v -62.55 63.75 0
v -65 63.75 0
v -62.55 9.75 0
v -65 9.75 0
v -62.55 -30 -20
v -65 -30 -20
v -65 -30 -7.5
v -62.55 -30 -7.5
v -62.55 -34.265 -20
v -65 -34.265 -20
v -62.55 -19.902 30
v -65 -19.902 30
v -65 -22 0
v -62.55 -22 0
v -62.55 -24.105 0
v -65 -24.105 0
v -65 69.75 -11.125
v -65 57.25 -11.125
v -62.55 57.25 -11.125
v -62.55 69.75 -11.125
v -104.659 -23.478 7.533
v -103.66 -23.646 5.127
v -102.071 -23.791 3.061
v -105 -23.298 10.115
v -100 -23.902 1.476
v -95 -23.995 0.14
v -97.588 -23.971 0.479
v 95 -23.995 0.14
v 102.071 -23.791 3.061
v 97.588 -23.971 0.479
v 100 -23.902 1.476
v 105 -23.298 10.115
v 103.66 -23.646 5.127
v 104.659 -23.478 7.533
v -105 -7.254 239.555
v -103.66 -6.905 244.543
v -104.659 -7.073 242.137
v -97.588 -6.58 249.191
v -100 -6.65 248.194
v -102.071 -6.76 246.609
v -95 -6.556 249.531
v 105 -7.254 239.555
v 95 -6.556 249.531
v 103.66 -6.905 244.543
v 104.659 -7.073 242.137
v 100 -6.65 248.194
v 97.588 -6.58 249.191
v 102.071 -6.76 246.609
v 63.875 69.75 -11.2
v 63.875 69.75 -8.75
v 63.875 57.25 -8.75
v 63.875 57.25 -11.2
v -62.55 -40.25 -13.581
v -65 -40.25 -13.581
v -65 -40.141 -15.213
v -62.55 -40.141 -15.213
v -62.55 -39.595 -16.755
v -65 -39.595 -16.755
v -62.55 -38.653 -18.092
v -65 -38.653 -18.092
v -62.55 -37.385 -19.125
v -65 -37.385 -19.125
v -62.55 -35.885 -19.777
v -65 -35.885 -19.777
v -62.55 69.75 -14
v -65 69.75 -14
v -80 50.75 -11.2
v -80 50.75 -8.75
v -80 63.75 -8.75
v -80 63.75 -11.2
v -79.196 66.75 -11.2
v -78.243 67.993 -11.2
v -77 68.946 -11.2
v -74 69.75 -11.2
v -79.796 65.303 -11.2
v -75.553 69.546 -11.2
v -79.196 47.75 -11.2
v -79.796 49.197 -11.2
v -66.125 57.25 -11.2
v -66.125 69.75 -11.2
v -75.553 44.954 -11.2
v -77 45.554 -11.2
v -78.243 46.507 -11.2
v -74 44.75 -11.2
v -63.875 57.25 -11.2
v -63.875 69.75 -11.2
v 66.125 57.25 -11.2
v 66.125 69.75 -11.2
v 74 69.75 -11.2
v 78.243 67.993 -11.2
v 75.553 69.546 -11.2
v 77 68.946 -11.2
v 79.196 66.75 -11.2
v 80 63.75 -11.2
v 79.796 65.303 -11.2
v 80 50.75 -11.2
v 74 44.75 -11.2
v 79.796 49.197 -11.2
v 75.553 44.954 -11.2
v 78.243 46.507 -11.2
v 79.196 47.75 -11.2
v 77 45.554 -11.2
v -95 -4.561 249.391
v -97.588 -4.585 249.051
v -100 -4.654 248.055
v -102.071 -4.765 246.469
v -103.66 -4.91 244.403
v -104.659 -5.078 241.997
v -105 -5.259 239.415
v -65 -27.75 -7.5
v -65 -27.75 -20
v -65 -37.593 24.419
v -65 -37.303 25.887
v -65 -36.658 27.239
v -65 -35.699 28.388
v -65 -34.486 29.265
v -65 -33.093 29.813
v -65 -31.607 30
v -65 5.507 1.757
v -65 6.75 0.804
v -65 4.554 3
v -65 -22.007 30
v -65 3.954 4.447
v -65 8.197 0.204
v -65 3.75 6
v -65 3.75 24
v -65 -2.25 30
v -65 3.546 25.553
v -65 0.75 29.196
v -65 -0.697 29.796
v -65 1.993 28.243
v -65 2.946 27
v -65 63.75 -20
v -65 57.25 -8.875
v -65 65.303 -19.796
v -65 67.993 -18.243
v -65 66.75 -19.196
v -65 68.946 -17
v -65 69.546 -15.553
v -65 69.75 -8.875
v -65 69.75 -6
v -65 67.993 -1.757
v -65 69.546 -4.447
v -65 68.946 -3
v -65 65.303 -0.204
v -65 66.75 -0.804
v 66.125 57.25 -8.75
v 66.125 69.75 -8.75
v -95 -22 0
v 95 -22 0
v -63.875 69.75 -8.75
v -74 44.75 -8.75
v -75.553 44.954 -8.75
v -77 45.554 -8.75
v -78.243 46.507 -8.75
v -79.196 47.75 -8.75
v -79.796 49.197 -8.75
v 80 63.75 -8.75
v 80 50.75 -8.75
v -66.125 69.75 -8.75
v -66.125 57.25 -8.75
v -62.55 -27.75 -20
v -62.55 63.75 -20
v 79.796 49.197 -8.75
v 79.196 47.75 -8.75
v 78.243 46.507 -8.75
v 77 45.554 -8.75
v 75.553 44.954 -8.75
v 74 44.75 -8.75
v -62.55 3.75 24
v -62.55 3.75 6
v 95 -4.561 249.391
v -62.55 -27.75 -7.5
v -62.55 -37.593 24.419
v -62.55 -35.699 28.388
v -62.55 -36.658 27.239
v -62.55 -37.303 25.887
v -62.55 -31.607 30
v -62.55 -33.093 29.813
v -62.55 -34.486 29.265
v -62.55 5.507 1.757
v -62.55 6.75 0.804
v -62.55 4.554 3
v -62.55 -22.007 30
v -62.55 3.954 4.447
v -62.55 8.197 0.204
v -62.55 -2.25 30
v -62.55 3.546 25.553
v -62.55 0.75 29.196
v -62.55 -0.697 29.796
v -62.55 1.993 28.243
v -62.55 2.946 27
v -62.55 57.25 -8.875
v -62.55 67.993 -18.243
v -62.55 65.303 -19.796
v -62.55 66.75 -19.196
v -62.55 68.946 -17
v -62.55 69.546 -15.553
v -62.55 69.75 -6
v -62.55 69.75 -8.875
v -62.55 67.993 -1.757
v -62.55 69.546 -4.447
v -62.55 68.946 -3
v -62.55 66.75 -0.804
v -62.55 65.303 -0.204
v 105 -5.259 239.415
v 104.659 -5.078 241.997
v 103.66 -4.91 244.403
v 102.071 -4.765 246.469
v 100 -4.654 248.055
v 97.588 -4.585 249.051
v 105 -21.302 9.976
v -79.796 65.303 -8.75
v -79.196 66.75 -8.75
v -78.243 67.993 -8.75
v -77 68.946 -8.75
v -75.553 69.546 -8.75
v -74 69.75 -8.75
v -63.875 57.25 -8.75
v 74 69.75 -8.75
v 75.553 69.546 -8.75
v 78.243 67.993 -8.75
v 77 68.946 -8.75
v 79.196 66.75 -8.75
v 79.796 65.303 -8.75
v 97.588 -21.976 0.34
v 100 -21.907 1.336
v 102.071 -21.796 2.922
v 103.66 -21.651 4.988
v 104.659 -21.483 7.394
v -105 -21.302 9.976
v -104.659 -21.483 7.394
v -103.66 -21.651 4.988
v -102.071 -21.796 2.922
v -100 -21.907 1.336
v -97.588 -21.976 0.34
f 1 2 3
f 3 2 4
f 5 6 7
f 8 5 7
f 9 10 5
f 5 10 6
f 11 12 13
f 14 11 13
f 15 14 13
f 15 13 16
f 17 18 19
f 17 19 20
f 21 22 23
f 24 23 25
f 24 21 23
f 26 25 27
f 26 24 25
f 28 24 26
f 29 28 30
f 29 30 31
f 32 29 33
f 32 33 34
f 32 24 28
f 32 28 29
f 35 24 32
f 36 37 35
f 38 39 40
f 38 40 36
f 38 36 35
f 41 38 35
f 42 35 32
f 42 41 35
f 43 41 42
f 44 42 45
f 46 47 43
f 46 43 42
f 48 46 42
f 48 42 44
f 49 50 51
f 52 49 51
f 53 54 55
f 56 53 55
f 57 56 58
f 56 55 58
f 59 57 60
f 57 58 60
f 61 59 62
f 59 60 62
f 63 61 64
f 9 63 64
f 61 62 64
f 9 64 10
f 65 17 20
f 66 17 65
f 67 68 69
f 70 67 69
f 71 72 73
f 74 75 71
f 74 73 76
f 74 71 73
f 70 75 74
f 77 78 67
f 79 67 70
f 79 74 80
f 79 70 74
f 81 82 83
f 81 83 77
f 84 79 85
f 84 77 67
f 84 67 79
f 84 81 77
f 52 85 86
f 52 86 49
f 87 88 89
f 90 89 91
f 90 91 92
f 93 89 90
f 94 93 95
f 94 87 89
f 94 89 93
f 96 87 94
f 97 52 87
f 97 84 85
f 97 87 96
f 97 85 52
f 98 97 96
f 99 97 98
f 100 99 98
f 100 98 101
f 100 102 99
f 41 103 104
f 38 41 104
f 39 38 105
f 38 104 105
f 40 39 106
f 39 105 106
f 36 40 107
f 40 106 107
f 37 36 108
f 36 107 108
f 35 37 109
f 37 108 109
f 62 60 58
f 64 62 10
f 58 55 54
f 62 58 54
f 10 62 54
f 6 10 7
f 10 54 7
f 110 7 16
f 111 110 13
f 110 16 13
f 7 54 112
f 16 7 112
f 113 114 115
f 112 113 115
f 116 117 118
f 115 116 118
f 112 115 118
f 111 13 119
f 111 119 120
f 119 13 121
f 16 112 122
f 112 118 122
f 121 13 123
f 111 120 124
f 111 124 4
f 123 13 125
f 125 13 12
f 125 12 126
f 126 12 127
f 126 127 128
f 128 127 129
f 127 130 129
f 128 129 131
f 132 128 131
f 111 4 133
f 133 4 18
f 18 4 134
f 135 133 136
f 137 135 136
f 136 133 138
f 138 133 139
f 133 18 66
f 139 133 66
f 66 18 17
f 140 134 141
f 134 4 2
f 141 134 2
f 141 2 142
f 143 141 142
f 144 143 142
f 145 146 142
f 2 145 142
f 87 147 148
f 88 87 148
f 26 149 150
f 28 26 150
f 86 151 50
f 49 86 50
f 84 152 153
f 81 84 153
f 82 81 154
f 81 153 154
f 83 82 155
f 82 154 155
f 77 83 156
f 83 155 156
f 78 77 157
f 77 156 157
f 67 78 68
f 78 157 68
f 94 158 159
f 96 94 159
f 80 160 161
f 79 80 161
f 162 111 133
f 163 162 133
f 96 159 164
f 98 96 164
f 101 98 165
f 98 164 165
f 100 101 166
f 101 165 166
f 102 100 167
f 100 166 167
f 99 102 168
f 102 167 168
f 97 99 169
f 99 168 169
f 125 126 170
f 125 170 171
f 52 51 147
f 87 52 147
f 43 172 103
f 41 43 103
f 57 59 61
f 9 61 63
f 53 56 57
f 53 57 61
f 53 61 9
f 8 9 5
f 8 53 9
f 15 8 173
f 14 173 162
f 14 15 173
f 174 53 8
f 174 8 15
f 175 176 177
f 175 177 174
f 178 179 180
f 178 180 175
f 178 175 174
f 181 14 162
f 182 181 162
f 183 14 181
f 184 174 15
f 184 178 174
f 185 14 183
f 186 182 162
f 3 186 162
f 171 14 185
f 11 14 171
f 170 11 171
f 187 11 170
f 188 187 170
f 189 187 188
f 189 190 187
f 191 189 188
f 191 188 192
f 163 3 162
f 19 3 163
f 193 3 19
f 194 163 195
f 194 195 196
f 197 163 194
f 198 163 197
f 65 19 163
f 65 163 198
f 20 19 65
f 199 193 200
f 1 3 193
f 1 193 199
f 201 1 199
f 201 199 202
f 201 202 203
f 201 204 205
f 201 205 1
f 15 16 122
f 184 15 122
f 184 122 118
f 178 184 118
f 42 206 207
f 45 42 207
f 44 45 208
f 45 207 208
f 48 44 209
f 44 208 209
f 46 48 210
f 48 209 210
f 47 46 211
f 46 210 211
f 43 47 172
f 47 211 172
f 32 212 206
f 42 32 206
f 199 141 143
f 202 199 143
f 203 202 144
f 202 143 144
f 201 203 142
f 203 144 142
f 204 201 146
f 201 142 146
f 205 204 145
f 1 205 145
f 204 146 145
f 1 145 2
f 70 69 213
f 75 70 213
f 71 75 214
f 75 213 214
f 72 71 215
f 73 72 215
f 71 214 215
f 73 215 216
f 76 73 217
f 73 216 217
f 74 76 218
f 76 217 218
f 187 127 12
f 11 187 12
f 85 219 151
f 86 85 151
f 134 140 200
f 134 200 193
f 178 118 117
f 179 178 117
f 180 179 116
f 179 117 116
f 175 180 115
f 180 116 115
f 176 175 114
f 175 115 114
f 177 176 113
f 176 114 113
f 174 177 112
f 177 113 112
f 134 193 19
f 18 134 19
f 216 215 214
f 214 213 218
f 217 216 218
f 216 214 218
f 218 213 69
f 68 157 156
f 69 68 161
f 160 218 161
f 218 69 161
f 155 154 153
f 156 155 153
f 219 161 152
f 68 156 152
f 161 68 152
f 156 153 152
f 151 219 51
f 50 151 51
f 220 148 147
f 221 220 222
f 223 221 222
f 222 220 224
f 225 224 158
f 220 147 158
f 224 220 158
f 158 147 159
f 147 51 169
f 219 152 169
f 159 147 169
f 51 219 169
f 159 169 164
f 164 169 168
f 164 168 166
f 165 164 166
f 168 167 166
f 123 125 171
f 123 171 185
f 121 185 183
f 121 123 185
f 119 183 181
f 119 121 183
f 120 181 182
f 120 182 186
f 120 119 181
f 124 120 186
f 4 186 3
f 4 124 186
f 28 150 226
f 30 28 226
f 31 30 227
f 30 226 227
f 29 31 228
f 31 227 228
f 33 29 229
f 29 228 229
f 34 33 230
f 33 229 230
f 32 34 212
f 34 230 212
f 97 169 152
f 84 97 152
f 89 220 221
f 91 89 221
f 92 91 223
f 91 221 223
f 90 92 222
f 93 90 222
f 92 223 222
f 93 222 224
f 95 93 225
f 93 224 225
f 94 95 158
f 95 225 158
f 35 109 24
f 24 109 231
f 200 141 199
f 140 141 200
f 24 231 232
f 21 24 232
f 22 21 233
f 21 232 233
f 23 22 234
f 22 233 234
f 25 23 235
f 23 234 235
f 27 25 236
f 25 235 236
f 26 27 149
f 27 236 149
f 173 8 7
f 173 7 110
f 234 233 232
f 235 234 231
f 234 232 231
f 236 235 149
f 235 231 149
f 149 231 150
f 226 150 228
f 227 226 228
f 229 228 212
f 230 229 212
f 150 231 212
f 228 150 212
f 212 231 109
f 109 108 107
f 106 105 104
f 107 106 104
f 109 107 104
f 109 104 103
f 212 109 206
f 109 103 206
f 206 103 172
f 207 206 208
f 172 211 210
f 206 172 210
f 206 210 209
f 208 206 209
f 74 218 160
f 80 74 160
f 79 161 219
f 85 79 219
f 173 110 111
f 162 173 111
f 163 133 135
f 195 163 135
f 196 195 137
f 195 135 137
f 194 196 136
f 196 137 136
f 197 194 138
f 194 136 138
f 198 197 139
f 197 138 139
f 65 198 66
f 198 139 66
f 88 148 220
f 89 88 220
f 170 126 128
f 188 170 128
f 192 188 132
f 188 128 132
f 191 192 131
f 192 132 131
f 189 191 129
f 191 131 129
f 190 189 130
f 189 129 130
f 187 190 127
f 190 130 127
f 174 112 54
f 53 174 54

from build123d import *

# Parameters (mm, degrees)
PAD_DEPTH               = 2
PAD010_DEPTH            = 2.45
PAD009_DEPTH            = 2.45
BODY015_PLACEMENT_ANGLE = 90


with BuildPart() as body:
    # Sketch (on DatumPlane) → Pad (new body)
    with BuildSketch(Plane(origin=(0, -22, 0), x_dir=(1, 0, 0), z_dir=(0, -0.997564, 0.069756))):
        with BuildLine():
            Line((-95, 0), (95, 0))
            ThreePointArc((95, 0), (102.071068, 2.928932), (105, 10))
            Line((105, 10), (105, 240))
            ThreePointArc((105, 240), (102.071068, 247.071068), (95, 250))
            Line((95, 250), (-95, 250))
            ThreePointArc((-95, 250), (-102.071068, 247.071068), (-105, 240))
            Line((-105, 240), (-105, 10))
            ThreePointArc((-105, 10), (-102.071068, 2.928932), (-95, 0))
        make_face()
    extrude(amount=PAD_DEPTH)


with BuildPart() as body011:
    # Sketch010 → Pad010 (new body)
    with BuildSketch(Plane.YZ.offset(65)):
        with BuildLine():
            Line((-19.902196, 30), (-22, 0))
            Line((-22, 0), (-24.105128, 0))
            Line((-24.105128, 0), (-22.007324, 30))
            Line((-22.007324, 30), (-31.607397, 30))
            ThreePointArc((-31.607397, 30), (-35.699387, 28.388122), (-37.592781, 24.418539))
            Line((-37.592781, 24.418539), (-40.25, -13.581461))
            ThreePointArc((-40.25, -13.581461), (-38.652738, -18.09199), (-34.264616, -20))
            Line((-34.264616, -20), (-30, -20))
            Line((-30, -20), (-30, -7.5))
            Line((-30, -7.5), (-27.75, -7.5))
            Line((-27.75, -7.5), (-27.75, -20))
            Line((-27.75, -20), (63.75, -20))
            ThreePointArc((63.75, -20), (67.992641, -18.242641), (69.75, -14))
            Line((69.75, -11.125), (69.75, -14))
            Line((57.25, -11.125), (69.75, -11.125))
            Line((57.25, -8.875), (57.25, -11.125))
            Line((69.75, -8.875), (57.25, -8.875))
            Line((69.75, -6), (69.75, -8.875))
            ThreePointArc((69.75, -6), (67.992641, -1.757359), (63.75, 0))
            Line((63.75, 0), (9.75, 0))
            ThreePointArc((3.75, 6), (5.507359, 1.757359), (9.75, 0))
            Line((3.75, 24), (3.75, 6))
            ThreePointArc((3.75, 24), (1.992641, 28.242641), (-2.25, 30))
            Line((-2.25, 30), (-19.902196, 30))
        make_face()
    extrude(amount=PAD010_DEPTH)


with BuildPart() as body011_1:
    # Body011 placement: moved
    add(body011.part.moved(Location((-130, 0, 0))))


with BuildPart() as body015:
    # Sketch012 (on Face13 of Binder001) → Pad009 (new body)
    with BuildSketch(Plane.XZ.offset(27.75)):
        with BuildLine():
            Line((-66.125, -20), (-66.125, -7.5))
            Line((-66.125, -7.5), (-63.875, -7.5))
            Line((-63.875, -7.5), (-63.875, -20))
            Line((-63.875, -20), (63.875, -20))
            Line((63.875, -20), (63.875, -7.5))
            Line((63.875, -7.5), (66.125, -7.5))
            Line((66.125, -7.5), (66.125, -20))
            Line((66.125, -20), (74, -20))
            ThreePointArc((74, -20), (78.242641, -18.242641), (80, -14))
            Line((80, -14), (80, -1))
            ThreePointArc((80, -1), (78.242641, 3.242641), (74, 5))
            Line((74, 5), (-74, 5))
            ThreePointArc((-74, 5), (-78.242641, 3.242641), (-80, -1))
            Line((-80, -1), (-80, -14))
            ThreePointArc((-80, -14), (-78.242641, -18.242641), (-74, -20))
            Line((-74, -20), (-66.125, -20))
        make_face()
    extrude(amount=PAD009_DEPTH)


with BuildPart() as body015_1:
    # Body015 placement: moved
    add(body015.part.moved(Location((0, 49.75, 19))).rotate(Axis((0, 49.75, 19), (1, 0, 0)), BODY015_PLACEMENT_ANGLE))


solid = Compound([body.part, body011_1.part, body015_1.part])
